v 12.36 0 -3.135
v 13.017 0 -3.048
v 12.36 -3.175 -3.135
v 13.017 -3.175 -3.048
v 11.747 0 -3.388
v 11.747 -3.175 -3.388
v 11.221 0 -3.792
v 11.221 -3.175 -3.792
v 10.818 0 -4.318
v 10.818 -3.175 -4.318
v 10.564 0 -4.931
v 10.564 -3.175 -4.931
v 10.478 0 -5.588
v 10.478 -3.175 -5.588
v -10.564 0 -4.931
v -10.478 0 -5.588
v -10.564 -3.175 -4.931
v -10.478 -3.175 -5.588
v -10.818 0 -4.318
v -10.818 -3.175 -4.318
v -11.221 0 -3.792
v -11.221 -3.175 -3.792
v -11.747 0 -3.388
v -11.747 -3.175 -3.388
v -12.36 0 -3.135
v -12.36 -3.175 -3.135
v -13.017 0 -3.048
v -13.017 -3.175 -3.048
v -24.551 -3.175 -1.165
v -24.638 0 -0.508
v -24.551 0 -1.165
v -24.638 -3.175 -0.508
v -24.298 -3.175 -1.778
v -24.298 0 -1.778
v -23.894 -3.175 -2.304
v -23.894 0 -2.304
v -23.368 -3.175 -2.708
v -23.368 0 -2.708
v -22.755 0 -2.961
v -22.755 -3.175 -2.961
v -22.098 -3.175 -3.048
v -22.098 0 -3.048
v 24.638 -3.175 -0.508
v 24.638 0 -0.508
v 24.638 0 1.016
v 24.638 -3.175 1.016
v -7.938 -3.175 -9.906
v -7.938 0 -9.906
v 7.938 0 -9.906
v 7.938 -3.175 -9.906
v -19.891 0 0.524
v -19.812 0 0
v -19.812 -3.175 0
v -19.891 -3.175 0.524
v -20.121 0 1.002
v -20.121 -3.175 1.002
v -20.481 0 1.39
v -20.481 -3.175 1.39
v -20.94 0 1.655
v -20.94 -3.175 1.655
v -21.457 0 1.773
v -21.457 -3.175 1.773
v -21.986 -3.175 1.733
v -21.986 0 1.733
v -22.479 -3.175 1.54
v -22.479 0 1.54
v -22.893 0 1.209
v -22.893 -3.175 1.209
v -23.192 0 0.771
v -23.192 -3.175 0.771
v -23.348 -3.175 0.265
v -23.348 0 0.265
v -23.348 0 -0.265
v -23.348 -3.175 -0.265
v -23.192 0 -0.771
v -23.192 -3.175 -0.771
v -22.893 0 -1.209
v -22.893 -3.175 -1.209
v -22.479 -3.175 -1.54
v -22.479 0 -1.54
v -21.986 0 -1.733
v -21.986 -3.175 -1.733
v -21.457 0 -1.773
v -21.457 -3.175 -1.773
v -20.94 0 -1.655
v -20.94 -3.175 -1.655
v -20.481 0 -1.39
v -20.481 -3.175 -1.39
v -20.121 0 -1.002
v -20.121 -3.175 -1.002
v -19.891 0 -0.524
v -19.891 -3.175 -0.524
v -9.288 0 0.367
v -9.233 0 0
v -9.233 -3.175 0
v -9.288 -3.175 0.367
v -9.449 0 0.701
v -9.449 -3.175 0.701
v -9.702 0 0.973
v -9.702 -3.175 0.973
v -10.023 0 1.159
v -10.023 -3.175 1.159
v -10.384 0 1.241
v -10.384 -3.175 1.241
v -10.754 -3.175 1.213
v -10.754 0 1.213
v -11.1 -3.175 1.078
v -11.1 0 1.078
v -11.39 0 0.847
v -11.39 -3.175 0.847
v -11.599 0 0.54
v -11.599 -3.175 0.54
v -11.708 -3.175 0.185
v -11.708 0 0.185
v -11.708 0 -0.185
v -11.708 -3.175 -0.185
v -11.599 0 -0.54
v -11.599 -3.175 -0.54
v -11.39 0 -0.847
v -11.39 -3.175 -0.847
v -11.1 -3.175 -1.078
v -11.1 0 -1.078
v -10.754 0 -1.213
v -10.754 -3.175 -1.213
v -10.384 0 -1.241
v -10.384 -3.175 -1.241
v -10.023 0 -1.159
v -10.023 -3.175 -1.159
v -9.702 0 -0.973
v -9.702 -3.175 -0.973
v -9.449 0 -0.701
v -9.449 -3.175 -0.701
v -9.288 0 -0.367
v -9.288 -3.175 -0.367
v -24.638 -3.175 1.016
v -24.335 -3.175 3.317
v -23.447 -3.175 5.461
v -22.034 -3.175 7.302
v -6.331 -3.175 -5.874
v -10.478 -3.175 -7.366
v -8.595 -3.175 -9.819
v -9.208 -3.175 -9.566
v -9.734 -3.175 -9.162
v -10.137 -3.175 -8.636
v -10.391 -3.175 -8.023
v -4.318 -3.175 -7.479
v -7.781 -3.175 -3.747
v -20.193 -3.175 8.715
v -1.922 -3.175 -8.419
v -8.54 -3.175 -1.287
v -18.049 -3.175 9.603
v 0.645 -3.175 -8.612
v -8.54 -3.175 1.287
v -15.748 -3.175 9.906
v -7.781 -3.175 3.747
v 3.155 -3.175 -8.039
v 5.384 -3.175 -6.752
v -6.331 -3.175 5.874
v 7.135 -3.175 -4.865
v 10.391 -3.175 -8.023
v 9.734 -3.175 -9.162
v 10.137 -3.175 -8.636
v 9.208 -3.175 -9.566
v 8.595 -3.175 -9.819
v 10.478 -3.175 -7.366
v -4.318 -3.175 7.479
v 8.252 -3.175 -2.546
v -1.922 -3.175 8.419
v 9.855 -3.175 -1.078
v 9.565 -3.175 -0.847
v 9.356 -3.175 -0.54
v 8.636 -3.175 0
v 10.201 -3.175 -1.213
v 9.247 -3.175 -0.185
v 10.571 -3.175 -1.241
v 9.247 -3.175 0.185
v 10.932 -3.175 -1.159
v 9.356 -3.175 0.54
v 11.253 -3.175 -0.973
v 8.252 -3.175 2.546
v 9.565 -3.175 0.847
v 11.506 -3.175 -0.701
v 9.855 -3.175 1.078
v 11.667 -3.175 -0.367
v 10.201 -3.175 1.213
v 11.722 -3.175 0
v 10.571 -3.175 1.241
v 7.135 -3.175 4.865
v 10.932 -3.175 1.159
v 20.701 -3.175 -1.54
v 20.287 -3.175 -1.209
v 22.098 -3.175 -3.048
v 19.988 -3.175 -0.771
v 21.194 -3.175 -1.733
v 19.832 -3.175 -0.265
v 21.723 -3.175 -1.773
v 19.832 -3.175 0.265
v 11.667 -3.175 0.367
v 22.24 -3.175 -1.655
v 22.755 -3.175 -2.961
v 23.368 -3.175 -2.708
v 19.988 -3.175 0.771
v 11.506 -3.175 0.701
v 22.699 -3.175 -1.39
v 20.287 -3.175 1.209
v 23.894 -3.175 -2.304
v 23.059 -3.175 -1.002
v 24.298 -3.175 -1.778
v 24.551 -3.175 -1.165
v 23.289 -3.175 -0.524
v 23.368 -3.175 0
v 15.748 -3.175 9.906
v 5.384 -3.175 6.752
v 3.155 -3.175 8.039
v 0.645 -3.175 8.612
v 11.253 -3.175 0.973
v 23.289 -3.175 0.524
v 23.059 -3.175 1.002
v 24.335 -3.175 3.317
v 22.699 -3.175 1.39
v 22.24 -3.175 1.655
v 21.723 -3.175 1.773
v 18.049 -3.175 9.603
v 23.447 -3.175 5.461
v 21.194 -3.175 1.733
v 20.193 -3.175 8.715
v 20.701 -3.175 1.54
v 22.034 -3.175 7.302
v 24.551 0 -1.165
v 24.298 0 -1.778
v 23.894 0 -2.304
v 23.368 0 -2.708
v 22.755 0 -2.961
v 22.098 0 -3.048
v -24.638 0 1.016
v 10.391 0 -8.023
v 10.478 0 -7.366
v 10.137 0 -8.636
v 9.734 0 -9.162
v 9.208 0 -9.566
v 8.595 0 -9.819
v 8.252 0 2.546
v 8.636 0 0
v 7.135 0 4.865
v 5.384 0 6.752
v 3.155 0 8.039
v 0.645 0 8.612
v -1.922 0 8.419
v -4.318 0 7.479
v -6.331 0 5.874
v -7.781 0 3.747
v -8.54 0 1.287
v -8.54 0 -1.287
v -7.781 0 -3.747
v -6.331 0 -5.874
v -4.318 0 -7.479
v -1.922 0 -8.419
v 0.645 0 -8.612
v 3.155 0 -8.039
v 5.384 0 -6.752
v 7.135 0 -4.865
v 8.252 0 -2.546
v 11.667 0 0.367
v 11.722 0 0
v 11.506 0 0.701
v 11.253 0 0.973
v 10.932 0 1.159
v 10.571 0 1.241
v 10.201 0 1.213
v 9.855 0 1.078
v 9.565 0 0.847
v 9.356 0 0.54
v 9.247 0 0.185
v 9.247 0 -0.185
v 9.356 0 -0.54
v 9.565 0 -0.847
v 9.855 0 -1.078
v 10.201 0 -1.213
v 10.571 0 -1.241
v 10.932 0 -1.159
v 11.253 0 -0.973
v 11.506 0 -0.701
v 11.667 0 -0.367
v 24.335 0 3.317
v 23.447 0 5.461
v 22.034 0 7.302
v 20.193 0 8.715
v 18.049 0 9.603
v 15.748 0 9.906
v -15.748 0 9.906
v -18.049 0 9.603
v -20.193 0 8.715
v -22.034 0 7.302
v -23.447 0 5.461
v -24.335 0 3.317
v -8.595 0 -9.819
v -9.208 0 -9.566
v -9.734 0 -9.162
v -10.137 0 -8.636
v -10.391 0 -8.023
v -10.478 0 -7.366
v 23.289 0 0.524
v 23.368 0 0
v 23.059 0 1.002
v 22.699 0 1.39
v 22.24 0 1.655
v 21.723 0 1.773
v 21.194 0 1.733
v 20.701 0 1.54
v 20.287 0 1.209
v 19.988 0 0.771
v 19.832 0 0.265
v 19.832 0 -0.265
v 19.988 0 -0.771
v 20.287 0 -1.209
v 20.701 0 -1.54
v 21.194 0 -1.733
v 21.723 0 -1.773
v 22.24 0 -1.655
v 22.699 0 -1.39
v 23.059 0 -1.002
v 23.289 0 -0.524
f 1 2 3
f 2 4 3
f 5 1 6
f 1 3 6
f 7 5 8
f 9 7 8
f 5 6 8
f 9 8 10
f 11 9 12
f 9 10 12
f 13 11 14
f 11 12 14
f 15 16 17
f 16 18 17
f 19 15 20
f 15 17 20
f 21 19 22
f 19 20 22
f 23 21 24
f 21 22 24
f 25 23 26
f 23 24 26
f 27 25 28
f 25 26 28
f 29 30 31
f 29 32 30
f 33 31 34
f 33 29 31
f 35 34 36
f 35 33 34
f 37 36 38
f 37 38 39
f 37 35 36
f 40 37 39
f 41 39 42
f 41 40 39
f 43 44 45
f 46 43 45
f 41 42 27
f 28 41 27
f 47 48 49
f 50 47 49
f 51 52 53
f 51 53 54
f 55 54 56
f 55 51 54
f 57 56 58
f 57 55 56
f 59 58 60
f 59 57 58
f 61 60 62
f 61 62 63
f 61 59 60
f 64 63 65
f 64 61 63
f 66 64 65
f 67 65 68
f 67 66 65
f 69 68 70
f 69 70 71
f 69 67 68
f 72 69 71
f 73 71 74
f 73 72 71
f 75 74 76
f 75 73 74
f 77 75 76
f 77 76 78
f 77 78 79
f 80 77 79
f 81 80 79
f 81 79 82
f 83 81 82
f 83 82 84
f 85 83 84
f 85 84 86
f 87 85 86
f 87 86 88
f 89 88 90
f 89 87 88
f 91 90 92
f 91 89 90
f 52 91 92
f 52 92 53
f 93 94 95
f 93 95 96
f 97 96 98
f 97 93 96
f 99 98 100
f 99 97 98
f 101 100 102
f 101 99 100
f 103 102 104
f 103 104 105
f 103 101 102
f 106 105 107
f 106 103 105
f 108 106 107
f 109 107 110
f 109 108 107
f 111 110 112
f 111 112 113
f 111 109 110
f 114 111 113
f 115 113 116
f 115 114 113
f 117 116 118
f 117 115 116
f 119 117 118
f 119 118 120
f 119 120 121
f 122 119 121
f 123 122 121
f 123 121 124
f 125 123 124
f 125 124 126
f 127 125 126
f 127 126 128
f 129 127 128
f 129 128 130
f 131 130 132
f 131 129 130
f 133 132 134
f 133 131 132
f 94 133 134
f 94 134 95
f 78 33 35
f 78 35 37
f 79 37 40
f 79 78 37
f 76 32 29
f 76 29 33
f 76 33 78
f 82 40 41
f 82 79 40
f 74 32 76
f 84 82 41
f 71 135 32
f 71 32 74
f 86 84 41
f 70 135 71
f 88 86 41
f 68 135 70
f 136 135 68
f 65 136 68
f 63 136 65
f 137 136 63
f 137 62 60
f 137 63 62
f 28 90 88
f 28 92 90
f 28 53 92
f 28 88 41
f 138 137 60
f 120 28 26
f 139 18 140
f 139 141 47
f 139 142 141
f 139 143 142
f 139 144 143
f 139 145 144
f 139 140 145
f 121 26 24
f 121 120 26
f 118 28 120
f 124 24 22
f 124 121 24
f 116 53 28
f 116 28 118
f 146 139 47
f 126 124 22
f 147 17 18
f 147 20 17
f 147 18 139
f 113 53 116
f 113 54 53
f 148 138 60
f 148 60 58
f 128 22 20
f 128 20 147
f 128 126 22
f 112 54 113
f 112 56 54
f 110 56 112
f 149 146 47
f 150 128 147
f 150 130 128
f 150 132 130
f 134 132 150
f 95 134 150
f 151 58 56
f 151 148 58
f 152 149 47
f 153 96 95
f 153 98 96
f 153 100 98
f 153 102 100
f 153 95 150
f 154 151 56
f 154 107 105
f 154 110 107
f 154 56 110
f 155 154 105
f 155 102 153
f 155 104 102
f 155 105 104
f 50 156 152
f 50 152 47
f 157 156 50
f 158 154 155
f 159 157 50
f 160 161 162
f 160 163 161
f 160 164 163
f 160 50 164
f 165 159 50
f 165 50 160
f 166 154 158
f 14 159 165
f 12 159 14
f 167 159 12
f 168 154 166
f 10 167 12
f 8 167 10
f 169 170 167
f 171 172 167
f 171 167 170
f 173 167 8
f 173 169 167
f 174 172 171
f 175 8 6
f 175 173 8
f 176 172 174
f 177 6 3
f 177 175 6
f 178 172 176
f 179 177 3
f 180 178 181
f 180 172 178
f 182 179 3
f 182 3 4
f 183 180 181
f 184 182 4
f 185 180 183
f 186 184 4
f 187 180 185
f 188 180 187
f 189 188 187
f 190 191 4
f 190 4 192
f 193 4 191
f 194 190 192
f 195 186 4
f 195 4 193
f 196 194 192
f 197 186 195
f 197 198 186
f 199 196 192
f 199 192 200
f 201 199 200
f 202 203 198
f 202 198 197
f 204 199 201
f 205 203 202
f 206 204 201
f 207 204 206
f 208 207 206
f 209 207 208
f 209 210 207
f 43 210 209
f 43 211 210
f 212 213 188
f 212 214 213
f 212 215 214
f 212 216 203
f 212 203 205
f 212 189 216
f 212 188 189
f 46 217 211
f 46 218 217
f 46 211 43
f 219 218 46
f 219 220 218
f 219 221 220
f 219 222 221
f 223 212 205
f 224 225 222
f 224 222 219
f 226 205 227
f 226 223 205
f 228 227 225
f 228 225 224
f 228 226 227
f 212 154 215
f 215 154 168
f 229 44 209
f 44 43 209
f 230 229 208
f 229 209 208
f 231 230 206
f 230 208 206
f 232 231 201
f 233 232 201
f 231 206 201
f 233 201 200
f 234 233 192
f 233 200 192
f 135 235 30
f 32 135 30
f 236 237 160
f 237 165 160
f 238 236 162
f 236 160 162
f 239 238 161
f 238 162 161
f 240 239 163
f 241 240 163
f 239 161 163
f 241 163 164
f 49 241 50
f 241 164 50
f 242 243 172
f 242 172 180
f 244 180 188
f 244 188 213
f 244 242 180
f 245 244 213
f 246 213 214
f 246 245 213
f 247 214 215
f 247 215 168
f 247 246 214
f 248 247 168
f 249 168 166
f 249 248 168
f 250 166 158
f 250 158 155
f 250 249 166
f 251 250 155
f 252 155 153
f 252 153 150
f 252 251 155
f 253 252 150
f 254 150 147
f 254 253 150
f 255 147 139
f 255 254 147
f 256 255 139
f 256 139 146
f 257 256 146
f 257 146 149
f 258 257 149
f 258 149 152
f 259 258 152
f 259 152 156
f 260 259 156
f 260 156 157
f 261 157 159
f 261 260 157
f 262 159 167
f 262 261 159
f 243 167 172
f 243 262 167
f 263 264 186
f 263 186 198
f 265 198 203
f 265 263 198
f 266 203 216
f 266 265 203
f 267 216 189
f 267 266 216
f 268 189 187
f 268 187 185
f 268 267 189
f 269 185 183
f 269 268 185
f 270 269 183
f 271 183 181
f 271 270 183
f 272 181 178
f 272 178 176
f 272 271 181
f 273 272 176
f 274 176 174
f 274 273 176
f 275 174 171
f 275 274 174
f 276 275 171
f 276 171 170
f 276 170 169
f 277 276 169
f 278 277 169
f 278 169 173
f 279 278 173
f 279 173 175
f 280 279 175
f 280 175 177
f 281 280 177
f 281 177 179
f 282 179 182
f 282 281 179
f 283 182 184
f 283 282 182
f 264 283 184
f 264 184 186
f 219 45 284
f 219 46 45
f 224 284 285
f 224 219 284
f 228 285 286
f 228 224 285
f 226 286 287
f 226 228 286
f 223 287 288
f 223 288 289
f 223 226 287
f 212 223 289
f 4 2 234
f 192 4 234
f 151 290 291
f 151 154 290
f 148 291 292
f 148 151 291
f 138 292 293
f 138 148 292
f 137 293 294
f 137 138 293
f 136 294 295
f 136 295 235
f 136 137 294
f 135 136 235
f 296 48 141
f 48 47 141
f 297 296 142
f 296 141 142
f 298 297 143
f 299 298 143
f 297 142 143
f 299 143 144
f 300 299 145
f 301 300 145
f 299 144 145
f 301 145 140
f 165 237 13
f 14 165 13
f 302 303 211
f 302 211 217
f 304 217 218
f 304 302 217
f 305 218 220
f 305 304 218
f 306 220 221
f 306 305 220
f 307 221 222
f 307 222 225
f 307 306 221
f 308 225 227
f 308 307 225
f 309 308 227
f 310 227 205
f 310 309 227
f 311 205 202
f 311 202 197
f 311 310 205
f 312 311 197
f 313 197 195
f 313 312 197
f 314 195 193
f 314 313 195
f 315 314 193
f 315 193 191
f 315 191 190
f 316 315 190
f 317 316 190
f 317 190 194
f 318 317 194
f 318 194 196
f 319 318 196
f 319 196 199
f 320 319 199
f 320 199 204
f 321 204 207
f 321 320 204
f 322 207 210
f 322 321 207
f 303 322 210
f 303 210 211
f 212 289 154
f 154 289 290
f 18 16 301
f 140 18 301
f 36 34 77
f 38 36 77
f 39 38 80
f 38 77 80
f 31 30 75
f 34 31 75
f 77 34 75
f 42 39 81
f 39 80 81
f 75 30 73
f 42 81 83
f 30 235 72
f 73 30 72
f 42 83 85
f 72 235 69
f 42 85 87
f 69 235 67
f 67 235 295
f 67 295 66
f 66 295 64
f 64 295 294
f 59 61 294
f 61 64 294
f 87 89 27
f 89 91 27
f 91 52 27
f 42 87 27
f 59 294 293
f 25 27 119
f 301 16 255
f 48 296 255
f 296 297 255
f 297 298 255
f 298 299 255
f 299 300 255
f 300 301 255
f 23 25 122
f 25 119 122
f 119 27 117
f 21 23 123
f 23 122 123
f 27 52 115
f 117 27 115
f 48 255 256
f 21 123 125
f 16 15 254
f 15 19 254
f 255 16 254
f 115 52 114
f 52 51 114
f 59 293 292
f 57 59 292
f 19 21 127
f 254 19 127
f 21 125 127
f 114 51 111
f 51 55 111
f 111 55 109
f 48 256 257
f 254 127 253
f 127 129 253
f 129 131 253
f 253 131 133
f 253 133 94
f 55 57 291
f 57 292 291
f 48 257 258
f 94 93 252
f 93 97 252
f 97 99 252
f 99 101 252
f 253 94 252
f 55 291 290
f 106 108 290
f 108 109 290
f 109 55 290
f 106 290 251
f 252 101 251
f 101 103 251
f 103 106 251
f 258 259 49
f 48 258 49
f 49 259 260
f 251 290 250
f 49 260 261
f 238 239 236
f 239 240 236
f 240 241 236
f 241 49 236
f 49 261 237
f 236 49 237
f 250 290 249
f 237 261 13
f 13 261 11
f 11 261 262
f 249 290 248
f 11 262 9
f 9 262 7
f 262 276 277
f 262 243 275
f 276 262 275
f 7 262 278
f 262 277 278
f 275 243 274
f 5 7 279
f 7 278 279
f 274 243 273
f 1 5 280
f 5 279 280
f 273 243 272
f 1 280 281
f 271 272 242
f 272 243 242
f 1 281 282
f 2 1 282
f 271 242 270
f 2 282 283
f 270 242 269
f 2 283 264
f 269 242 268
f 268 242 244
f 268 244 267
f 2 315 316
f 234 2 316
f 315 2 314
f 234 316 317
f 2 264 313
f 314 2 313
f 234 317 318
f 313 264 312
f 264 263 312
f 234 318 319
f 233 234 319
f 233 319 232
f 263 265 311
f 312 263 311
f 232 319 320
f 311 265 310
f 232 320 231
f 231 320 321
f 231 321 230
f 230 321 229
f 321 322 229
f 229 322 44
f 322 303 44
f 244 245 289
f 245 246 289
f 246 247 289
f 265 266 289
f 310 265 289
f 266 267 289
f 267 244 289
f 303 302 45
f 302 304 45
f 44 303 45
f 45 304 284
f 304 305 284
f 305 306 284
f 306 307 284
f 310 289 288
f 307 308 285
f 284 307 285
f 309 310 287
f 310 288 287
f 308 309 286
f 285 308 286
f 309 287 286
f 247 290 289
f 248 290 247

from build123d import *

# Parameters (mm, degrees)
F0_R     = 1.778
F0_R_2   = 1.2446
F0_R_3   = 8.636
F1_DEPTH = 3.175
F2_R     = 8.89
F3_R     = 2.54


with BuildPart() as f1:
    # F0 (on Front) → F1 (new body)
    with BuildSketch(Plane.XZ):
        Polygon((24.638, -3.048), (24.638, 9.906), (-24.638, 9.906), (-24.638, -3.048), (-10.4775, -3.048), (-10.4775, -9.906), (10.4775, -9.906), (10.4775, -3.048), align=None)
        with Locations((-21.59, 0)):
            Circle(F0_R, mode=Mode.SUBTRACT)
        with Locations((-10.4775, 0)):
            Circle(F0_R_2, mode=Mode.SUBTRACT)
        Circle(F0_R_3, mode=Mode.SUBTRACT)
        with Locations((10.4775, 0)):
            Circle(F0_R_2, mode=Mode.SUBTRACT)
        with Locations((21.59, 0)):
            Circle(F0_R, mode=Mode.SUBTRACT)
    extrude(amount=F1_DEPTH)

    # F2
    f2_edges = [f1.edges().sort_by_distance(p)[0] for p in [
        (-24.638, -1.5875, 9.906),
        (24.638, -1.5875, 9.906),
    ]]
    fillet(f2_edges, radius=F2_R)

    # F3
    f3_edges = [f1.edges().sort_by_distance(p)[0] for p in [
        (-24.638, -1.5875, -3.048),
        (-10.4775, -1.5875, -3.048),
        (-10.4775, -1.5875, -9.906),
        (10.4775, -1.5875, -9.906),
        (24.638, -1.5875, -3.048),
        (10.4775, -1.5875, -3.048),
    ]]
    fillet(f3_edges, radius=F3_R)


solid = f1.part
